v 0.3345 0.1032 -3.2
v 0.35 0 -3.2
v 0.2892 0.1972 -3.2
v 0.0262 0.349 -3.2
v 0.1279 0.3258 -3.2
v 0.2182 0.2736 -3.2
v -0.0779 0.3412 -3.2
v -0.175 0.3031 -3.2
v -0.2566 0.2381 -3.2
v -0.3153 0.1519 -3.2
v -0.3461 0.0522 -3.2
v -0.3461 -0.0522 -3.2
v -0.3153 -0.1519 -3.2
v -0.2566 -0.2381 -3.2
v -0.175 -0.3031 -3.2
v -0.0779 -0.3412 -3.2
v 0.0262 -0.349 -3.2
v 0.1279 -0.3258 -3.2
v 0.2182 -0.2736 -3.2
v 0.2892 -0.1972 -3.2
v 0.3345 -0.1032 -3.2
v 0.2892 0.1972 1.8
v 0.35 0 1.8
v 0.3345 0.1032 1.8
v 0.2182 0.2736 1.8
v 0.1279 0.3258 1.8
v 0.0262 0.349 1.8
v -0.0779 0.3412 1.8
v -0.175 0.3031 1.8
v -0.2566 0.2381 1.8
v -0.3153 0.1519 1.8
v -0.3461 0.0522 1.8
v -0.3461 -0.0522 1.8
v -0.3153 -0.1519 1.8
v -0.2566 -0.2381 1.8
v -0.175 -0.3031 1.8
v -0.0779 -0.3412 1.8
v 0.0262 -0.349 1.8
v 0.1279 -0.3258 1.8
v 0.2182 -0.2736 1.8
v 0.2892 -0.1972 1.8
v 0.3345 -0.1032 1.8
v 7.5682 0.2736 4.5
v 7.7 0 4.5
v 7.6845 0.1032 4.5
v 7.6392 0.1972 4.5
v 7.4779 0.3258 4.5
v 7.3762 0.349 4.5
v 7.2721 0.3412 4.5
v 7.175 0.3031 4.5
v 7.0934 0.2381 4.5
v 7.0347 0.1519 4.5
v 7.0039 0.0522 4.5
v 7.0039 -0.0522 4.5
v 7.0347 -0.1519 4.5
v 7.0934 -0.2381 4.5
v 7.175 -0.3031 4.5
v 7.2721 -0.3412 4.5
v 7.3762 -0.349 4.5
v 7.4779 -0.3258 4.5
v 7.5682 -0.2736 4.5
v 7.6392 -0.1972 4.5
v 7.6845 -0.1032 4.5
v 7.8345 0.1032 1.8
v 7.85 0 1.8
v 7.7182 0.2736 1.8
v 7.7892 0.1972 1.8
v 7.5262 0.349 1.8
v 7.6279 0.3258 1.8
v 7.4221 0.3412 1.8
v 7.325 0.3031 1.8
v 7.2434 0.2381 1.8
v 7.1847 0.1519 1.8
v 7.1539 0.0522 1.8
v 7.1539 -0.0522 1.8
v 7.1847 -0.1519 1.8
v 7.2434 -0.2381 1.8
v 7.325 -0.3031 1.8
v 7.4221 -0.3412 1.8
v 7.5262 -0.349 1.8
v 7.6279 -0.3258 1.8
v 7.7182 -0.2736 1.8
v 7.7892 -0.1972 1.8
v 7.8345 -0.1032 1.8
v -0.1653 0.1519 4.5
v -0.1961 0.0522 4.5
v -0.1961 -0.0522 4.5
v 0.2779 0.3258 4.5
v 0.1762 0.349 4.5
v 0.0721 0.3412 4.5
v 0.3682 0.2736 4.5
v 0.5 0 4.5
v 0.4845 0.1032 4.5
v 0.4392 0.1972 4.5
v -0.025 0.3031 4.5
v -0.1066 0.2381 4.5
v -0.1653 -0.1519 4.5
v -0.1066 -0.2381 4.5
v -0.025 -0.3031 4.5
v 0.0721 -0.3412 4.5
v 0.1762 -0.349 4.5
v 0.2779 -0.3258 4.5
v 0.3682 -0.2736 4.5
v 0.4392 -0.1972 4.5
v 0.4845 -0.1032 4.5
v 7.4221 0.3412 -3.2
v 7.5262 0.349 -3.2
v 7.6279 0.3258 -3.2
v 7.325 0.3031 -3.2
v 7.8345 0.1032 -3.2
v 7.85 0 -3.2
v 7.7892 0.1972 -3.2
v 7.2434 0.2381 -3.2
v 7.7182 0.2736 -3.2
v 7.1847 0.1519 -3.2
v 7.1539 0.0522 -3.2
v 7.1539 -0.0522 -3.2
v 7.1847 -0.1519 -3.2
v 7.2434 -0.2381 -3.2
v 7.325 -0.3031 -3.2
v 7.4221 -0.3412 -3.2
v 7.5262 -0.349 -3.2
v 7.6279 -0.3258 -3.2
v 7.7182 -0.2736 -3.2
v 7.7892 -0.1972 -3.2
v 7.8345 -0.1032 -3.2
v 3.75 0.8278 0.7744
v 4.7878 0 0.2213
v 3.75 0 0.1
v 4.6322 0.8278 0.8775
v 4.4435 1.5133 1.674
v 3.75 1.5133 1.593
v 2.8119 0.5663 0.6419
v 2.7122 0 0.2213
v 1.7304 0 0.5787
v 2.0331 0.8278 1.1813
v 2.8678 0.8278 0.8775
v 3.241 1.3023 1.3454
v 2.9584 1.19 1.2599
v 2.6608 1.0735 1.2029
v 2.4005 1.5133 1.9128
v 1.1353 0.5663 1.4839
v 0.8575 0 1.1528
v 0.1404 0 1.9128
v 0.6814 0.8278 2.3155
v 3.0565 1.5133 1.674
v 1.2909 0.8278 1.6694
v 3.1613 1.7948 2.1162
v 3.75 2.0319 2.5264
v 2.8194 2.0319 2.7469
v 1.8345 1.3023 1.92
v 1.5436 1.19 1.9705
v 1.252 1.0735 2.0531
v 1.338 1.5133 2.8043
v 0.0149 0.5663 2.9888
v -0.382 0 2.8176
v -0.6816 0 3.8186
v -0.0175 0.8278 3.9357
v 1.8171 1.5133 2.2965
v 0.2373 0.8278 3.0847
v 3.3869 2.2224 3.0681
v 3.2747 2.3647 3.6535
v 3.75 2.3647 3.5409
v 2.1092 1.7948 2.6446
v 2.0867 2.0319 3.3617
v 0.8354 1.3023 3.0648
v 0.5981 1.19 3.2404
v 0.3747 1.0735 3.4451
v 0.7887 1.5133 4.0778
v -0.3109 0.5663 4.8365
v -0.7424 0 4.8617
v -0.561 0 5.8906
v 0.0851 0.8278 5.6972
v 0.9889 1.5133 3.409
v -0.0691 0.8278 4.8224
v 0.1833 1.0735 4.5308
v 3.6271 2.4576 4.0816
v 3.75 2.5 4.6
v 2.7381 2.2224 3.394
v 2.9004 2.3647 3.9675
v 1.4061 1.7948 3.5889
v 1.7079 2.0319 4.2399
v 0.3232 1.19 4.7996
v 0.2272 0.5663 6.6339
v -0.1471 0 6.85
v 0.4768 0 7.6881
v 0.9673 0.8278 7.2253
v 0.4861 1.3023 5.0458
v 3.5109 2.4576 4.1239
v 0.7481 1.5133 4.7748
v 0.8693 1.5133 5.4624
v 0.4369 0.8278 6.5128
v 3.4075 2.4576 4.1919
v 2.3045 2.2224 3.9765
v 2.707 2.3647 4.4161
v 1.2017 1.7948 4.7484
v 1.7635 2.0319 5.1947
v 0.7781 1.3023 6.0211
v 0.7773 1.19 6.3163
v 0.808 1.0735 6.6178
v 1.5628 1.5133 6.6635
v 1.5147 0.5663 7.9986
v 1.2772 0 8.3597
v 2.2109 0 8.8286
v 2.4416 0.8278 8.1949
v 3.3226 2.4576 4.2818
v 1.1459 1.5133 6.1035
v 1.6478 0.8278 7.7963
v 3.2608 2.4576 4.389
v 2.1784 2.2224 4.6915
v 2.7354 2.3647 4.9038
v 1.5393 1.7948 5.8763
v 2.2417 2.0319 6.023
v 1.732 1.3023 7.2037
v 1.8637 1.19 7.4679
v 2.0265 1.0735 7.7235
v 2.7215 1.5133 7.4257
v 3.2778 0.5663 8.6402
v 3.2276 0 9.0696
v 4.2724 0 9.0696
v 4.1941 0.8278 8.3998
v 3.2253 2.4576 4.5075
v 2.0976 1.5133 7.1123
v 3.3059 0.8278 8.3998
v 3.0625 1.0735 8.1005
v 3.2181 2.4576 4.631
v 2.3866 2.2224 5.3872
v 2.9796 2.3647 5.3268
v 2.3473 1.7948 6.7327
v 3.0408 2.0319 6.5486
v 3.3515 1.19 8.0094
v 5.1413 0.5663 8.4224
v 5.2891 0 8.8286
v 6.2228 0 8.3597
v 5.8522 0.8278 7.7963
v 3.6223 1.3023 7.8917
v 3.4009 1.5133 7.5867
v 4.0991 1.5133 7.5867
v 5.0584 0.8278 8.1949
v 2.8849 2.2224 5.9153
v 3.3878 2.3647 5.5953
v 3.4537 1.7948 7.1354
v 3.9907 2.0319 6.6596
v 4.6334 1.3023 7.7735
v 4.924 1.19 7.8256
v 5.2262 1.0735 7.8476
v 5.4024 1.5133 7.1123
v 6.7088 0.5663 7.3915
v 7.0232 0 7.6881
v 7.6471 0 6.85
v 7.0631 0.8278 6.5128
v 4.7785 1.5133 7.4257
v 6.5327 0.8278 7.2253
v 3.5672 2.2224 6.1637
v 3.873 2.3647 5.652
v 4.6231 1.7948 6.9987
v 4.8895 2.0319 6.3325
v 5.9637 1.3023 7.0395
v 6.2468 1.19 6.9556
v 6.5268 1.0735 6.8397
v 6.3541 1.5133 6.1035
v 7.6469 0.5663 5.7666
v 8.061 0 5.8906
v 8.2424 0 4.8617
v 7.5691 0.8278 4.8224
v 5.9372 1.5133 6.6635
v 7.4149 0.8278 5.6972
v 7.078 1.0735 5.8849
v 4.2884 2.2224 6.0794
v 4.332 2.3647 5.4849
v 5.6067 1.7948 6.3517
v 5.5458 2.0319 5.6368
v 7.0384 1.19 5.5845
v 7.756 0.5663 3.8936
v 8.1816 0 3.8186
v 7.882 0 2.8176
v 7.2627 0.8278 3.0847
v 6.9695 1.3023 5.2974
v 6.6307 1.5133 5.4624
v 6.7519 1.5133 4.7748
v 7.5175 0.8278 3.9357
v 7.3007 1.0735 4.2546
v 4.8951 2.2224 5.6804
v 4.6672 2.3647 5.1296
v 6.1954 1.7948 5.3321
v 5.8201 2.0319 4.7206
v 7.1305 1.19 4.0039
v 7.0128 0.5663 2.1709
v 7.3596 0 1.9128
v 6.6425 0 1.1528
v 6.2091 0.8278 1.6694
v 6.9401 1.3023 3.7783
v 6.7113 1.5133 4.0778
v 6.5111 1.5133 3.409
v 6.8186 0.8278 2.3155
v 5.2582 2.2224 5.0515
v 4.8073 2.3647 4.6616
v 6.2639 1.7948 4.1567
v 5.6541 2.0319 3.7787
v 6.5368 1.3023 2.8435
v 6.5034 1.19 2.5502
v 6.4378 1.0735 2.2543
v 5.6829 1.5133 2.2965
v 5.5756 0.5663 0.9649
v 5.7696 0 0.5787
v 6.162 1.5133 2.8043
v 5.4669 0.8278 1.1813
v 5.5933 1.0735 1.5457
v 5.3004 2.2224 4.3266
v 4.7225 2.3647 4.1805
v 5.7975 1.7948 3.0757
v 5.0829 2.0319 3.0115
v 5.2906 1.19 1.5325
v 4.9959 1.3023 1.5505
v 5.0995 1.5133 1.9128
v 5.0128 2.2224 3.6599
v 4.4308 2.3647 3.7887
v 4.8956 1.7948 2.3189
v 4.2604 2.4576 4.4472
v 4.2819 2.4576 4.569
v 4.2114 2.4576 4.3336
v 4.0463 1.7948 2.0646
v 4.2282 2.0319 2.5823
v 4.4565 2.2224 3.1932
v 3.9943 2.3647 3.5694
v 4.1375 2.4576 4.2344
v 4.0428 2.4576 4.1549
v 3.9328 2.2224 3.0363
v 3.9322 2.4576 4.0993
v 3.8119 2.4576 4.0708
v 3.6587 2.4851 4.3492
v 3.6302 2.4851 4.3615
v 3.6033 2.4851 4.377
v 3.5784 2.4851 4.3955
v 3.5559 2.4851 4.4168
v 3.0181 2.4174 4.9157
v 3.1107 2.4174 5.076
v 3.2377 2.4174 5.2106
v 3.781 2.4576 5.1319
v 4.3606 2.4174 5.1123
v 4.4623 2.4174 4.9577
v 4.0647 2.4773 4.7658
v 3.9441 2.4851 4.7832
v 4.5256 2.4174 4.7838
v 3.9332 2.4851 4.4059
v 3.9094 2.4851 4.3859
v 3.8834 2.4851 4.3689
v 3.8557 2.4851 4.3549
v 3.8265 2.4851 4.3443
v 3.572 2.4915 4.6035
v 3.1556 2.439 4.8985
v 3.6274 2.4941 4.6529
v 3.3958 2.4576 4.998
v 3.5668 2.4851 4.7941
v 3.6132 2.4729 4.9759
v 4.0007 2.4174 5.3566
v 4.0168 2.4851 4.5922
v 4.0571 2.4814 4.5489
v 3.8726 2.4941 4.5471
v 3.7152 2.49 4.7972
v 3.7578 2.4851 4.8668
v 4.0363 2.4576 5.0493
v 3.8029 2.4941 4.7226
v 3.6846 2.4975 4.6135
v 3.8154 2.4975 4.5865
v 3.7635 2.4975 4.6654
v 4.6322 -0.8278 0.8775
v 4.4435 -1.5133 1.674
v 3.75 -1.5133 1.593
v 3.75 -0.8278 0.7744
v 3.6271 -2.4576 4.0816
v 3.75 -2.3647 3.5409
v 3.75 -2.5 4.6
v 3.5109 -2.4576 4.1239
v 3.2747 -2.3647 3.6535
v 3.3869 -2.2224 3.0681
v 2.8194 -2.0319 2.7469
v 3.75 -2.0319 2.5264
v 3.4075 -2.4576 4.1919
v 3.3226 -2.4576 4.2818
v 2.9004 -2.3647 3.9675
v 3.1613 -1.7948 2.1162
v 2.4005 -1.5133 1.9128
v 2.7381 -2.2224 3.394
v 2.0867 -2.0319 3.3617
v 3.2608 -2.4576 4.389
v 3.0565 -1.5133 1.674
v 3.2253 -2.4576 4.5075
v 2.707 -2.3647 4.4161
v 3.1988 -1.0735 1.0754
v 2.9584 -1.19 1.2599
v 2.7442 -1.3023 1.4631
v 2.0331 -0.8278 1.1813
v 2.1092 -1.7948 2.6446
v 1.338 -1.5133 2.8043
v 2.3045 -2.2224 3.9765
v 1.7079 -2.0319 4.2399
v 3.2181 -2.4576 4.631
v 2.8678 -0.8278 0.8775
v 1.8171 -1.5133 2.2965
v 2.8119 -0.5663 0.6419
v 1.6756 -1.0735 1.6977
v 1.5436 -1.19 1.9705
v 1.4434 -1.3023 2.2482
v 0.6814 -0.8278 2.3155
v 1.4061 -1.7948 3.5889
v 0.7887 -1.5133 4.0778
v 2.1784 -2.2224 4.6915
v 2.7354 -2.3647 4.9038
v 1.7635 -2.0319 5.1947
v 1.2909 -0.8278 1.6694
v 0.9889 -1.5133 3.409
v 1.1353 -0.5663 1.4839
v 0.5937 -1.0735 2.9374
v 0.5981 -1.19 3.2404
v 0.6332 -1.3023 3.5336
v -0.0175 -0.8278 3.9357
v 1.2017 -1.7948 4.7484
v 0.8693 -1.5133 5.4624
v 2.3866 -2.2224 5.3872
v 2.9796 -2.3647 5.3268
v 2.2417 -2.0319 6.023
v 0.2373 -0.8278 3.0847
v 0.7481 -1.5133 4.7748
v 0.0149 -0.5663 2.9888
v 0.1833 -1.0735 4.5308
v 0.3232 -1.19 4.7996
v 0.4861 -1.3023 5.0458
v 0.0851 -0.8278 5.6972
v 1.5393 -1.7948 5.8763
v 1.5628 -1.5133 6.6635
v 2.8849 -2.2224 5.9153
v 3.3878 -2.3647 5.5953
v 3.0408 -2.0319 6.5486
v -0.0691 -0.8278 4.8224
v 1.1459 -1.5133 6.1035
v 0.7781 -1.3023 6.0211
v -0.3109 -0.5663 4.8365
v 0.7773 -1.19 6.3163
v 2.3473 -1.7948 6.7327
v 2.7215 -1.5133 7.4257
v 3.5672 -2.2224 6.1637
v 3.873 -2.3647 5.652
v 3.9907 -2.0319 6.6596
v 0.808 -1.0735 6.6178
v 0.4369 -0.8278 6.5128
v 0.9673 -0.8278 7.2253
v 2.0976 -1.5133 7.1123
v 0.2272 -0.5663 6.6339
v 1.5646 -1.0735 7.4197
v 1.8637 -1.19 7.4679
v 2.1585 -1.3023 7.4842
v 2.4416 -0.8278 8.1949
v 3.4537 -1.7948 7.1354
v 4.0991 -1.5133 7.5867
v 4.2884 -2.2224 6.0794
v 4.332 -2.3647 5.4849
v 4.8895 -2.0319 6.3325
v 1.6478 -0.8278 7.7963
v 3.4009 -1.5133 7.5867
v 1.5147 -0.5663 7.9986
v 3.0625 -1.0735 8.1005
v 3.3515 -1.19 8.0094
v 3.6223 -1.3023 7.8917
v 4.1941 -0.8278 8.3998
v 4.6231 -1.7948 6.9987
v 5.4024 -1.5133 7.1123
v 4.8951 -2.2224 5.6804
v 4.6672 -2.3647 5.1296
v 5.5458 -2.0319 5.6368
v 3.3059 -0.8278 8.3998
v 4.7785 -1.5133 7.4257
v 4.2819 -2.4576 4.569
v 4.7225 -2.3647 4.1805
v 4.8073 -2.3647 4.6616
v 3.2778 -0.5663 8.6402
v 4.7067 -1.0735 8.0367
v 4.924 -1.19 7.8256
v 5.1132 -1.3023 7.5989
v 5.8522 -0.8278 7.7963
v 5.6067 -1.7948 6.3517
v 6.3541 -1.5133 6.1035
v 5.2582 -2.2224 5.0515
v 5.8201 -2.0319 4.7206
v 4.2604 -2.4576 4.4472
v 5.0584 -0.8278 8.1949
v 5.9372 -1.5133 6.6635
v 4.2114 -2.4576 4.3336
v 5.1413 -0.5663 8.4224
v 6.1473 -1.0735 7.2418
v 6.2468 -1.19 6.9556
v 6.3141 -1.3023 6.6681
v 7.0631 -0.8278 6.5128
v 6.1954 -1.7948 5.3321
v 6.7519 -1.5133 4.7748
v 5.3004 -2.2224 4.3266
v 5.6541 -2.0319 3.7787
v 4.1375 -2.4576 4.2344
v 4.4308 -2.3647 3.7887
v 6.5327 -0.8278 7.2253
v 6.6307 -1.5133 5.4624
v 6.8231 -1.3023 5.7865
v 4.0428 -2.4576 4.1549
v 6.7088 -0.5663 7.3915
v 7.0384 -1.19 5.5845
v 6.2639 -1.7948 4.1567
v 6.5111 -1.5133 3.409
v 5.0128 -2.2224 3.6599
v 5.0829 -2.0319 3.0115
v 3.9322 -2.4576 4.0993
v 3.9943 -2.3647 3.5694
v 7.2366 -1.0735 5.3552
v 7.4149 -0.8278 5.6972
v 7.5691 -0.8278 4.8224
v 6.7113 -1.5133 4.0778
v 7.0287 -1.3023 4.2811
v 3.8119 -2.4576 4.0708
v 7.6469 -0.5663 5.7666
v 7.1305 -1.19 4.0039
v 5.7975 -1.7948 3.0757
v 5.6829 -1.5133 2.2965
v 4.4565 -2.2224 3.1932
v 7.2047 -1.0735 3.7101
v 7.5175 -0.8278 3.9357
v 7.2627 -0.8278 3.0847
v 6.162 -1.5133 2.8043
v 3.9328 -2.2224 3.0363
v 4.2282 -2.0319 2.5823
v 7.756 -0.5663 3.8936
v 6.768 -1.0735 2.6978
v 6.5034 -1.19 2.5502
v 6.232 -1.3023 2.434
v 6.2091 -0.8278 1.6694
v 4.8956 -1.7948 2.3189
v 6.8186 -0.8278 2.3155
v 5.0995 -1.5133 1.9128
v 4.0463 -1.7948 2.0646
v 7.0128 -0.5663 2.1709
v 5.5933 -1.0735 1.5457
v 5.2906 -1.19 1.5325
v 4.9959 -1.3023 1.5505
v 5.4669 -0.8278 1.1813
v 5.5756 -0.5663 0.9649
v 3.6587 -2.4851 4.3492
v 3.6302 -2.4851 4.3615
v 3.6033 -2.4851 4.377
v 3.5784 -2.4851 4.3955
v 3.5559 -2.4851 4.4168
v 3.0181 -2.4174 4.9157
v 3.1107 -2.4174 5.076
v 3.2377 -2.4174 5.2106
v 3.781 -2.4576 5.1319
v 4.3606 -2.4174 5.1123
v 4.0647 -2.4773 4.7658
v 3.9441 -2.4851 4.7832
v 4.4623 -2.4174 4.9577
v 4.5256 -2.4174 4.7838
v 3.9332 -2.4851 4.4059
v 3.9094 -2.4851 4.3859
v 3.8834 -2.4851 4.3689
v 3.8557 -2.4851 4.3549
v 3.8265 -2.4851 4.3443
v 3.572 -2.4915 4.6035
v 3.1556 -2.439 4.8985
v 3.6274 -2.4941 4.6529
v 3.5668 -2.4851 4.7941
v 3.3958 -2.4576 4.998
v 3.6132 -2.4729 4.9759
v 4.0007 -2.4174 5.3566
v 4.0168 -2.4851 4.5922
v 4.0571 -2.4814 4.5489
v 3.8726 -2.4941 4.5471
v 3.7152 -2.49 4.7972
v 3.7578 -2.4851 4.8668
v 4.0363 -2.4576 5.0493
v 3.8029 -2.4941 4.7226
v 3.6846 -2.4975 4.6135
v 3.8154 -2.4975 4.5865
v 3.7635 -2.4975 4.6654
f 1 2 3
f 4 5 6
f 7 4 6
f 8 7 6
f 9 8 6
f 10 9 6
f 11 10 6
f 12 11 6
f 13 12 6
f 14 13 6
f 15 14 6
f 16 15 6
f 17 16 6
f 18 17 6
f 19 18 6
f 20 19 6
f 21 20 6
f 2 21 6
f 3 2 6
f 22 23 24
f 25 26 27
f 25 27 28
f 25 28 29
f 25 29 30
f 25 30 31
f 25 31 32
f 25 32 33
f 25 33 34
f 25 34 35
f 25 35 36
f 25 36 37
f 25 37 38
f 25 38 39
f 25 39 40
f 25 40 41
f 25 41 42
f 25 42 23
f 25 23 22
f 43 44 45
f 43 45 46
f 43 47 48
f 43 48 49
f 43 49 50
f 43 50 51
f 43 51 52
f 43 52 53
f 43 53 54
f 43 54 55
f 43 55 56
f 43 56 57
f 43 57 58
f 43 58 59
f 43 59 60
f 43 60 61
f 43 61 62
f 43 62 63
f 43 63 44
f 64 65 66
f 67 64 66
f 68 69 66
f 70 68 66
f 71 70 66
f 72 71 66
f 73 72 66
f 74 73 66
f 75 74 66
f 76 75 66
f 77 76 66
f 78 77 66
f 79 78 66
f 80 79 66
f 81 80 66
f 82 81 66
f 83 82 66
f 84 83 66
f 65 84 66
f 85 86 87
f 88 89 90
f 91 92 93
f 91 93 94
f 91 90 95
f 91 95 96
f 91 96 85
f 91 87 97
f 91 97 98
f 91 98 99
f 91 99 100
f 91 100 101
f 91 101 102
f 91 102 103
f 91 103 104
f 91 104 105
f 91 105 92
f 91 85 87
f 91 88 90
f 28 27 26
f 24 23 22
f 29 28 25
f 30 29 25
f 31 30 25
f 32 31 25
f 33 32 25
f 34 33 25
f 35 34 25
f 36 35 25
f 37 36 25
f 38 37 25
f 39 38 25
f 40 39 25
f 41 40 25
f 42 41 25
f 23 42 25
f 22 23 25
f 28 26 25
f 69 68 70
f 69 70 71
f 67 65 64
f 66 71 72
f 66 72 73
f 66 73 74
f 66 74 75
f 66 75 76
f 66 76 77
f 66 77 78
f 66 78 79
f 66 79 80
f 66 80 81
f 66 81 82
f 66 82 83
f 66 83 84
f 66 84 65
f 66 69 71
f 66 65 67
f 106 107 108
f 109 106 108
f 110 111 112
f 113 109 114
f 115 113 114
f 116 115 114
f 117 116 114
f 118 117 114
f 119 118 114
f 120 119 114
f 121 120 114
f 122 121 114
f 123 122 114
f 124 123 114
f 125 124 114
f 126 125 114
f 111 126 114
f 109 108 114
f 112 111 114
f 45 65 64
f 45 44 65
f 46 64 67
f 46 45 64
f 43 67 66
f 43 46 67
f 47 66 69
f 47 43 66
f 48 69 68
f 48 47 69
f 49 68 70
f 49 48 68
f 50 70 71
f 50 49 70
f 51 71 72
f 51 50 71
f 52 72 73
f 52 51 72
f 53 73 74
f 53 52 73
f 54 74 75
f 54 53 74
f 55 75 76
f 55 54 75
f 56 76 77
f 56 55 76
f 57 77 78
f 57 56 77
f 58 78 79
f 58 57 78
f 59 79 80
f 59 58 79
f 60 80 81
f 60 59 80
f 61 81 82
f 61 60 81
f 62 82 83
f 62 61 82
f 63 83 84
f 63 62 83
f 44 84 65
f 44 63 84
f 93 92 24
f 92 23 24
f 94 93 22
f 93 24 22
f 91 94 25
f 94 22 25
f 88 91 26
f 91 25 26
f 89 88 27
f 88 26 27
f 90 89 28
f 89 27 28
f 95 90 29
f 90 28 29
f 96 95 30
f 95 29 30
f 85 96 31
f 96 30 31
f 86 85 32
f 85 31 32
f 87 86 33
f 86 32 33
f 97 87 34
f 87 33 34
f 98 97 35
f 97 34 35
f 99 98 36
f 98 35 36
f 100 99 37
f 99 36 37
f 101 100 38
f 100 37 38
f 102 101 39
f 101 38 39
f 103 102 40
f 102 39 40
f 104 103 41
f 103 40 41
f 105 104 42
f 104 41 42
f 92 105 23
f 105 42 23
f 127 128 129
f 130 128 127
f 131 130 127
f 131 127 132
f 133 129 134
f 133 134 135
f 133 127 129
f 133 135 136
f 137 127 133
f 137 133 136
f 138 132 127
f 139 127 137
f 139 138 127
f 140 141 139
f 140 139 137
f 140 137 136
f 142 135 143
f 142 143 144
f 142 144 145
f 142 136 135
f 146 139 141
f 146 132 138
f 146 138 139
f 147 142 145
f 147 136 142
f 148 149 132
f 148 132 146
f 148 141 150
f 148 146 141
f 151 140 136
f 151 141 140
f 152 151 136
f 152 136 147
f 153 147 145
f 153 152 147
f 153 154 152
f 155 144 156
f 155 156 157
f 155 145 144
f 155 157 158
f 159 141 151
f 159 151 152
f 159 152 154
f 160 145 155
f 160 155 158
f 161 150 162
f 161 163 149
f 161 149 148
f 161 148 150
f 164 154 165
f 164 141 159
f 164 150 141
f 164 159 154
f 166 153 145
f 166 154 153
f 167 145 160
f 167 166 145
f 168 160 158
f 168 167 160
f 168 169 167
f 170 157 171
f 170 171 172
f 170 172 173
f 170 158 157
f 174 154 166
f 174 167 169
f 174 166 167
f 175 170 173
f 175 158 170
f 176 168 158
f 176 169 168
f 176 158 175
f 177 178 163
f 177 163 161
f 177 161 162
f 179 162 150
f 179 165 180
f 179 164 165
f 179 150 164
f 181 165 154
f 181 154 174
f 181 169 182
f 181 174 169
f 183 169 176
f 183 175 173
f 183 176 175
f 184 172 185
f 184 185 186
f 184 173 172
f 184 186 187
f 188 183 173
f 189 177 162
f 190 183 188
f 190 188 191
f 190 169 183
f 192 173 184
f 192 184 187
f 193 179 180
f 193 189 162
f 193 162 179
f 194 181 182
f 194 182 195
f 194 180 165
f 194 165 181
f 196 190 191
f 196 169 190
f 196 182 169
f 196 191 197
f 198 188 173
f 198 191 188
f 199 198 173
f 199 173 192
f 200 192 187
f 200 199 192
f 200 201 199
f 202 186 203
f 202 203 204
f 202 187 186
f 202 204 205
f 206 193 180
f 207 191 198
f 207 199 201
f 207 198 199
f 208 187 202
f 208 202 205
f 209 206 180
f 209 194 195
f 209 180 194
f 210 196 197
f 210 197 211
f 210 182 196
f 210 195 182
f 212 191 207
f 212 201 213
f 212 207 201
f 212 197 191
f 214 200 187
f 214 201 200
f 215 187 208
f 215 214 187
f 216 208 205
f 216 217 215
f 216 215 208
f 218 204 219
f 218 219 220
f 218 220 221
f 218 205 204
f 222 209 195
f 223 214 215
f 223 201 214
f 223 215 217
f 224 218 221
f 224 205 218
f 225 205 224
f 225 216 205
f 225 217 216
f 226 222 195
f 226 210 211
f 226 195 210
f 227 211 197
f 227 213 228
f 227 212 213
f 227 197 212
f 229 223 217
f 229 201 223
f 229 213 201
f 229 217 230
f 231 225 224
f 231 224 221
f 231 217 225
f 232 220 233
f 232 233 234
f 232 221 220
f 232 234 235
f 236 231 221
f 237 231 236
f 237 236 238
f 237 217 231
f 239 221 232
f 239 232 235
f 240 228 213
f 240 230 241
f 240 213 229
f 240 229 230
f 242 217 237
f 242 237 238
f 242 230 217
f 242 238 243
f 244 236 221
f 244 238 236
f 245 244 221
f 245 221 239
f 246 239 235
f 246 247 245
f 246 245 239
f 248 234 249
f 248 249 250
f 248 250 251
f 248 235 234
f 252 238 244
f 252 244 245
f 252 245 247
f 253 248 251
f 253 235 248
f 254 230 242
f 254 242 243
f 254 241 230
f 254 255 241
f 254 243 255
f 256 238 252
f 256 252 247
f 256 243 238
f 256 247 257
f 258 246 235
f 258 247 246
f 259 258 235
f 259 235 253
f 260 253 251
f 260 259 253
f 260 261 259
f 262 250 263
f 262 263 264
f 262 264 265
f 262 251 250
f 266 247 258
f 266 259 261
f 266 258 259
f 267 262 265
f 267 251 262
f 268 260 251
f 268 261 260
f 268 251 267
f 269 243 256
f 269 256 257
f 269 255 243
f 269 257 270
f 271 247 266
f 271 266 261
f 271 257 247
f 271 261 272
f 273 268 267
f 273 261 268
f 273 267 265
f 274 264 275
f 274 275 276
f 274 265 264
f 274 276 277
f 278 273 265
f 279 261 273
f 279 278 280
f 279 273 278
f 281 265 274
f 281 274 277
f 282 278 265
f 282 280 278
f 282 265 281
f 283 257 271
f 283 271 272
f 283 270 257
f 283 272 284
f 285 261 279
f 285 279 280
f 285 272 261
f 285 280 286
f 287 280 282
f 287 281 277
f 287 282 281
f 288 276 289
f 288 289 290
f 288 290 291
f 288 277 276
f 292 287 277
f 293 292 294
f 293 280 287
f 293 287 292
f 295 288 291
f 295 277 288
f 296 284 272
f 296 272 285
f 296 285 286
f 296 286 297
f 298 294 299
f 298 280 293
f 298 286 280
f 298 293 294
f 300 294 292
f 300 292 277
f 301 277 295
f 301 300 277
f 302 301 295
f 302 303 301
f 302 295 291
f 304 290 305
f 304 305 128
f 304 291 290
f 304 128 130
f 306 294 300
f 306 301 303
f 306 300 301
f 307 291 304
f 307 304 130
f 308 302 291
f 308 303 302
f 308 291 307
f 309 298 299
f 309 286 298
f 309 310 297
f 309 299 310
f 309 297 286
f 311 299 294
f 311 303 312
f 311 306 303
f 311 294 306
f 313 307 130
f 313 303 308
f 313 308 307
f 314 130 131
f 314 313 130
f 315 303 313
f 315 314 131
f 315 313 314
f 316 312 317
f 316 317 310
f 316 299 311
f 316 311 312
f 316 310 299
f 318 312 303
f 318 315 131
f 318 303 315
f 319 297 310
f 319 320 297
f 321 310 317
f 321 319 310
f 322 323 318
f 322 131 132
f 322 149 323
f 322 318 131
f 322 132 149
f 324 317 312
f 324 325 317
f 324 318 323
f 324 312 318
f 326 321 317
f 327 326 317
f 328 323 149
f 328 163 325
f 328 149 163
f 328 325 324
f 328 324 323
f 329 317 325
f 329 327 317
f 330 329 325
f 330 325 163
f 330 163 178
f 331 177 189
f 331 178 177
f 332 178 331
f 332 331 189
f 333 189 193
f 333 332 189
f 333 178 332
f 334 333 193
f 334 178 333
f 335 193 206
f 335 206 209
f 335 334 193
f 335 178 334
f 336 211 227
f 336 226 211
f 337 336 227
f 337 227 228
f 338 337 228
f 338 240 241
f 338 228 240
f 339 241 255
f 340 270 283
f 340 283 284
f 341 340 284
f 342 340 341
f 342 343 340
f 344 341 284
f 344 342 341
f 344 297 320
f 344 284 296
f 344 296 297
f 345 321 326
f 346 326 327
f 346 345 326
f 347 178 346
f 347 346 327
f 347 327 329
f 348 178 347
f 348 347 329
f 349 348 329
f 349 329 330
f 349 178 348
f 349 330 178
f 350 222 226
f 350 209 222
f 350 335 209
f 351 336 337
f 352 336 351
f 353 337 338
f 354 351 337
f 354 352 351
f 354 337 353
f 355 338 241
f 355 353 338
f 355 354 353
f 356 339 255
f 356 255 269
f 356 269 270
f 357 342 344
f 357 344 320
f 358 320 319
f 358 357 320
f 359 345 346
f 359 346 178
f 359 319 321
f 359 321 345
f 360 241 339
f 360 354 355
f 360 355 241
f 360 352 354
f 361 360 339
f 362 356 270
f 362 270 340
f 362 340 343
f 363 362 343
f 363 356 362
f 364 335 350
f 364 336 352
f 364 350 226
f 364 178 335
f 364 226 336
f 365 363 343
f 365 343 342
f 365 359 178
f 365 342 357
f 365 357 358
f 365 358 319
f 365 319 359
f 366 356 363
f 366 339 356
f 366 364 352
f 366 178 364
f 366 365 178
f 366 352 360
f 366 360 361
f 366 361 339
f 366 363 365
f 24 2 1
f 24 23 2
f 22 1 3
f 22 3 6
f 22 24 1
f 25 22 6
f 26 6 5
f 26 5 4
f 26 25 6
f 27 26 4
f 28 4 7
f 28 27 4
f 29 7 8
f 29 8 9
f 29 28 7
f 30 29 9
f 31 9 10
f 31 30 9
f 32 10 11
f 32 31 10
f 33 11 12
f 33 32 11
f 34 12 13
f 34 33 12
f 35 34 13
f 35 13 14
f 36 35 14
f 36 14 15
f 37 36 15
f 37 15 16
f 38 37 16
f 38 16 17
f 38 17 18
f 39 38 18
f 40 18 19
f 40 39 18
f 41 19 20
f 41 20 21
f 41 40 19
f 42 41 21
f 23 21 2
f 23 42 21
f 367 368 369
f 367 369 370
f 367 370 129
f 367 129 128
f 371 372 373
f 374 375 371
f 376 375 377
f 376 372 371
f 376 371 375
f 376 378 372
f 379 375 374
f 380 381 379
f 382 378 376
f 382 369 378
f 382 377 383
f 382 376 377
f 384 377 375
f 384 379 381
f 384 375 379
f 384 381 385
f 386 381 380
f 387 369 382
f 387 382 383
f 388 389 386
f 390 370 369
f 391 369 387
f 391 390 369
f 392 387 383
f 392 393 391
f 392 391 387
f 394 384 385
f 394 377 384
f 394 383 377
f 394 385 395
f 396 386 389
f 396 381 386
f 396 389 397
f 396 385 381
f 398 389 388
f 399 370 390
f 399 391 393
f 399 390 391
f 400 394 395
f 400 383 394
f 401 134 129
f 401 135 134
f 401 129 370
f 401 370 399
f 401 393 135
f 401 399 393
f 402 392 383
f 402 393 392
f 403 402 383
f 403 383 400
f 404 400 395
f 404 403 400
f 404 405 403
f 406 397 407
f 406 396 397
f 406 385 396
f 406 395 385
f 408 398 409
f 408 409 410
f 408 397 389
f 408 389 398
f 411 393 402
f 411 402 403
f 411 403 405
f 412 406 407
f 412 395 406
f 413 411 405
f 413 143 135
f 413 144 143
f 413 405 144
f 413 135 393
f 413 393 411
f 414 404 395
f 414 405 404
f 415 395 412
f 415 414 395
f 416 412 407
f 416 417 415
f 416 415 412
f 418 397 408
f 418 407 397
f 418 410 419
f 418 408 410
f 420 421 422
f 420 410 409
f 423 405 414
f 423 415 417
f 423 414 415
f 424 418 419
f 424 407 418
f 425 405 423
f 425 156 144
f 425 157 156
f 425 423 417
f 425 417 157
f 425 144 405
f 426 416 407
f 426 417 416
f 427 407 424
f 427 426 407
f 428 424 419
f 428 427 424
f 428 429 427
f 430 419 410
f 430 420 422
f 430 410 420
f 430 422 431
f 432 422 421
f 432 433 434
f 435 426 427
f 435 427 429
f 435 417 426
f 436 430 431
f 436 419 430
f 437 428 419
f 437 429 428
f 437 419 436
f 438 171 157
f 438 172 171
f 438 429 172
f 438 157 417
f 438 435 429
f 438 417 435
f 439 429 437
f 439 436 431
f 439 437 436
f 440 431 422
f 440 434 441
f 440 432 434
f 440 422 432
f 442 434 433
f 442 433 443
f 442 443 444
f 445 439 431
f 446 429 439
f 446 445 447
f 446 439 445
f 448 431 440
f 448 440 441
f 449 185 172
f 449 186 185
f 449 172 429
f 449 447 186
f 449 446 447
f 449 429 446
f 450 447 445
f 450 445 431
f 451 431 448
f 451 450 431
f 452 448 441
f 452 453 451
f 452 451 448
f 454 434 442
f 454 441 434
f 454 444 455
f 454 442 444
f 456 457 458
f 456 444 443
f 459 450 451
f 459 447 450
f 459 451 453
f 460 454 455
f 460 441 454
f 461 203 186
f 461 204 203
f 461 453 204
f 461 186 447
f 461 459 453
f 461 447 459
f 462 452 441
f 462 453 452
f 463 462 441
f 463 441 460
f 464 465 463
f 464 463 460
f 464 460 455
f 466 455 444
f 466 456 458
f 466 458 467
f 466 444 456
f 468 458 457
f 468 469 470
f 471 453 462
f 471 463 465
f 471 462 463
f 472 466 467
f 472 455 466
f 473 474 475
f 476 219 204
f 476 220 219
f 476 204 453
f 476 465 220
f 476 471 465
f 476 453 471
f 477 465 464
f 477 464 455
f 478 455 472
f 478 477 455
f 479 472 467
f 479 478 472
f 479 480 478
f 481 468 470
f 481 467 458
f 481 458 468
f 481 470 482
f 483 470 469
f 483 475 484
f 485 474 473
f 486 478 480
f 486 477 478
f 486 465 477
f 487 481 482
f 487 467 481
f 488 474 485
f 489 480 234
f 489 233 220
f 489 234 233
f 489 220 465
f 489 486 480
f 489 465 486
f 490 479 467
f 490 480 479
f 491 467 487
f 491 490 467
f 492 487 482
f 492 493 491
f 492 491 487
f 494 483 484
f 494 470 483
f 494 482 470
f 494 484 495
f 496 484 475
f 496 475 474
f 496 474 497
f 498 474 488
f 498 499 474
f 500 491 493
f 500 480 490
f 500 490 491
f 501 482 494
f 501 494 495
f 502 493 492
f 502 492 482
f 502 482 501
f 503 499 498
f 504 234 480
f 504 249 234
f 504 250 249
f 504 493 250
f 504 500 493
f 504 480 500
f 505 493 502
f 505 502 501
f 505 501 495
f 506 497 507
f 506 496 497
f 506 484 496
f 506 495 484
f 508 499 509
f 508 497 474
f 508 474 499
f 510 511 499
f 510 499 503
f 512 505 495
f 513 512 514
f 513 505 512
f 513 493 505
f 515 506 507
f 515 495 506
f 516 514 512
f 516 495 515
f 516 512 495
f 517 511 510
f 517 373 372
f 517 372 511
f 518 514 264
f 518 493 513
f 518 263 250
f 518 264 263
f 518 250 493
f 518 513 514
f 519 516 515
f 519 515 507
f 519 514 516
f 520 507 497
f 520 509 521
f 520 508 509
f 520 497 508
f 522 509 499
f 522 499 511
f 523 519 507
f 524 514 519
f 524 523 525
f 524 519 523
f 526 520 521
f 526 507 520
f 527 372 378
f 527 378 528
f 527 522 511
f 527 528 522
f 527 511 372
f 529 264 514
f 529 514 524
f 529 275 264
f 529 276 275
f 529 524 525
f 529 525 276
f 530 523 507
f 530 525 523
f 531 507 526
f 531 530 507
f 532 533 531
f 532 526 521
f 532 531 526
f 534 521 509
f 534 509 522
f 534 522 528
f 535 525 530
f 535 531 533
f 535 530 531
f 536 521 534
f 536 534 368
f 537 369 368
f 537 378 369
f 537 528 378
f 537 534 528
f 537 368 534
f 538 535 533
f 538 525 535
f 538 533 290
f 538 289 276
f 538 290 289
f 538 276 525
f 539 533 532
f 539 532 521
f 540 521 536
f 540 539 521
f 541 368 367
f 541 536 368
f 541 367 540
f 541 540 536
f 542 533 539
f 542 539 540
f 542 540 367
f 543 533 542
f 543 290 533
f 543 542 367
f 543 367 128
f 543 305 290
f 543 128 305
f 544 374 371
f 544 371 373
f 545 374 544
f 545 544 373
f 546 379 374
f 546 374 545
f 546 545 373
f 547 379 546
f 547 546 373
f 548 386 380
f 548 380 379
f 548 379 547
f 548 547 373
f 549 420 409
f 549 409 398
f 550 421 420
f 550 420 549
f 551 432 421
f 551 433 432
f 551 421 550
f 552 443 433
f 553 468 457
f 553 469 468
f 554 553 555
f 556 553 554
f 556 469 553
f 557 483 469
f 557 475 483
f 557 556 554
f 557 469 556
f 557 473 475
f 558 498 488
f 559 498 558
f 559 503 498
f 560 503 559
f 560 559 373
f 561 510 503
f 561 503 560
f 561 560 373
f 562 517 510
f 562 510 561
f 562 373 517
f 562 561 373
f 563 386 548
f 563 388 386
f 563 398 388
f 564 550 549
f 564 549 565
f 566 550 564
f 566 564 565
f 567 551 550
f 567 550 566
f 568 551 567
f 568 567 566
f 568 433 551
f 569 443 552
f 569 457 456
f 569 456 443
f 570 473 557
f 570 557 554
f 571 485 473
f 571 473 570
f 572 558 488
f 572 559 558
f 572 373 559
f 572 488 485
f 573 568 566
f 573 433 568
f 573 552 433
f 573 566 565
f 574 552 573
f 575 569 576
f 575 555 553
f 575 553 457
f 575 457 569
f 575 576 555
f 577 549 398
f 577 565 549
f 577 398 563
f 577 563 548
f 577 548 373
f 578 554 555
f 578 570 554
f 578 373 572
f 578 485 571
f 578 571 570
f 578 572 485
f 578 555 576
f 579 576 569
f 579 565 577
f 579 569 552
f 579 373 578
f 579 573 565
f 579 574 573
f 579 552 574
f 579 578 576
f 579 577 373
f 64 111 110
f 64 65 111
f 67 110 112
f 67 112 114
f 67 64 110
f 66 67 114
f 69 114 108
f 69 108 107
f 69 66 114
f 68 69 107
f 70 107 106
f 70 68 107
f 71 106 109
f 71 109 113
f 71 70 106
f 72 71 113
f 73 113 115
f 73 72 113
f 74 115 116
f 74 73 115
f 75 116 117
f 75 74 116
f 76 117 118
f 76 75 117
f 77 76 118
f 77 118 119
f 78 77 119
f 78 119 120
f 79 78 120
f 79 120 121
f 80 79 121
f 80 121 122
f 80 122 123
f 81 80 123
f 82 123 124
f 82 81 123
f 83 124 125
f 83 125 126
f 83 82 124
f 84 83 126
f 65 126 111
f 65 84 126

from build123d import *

# Parameters (mm, degrees)
SKETCH001_R       = 0.35
PAD001_DEPTH      = 1.8
PAD001_DEPTH_BACK = 3.2
SKETCH002_R       = 0.35
SKETCH003_R       = 0.35
SKETCH004_R       = 0.35
SKETCH005_R       = 0.35


with BuildPart() as pad001:
    # Sketch001 → Pad001 (new body, two sides)
    with BuildSketch(Plane.XY) as pad001_sk:
        Circle(SKETCH001_R)
        with Locations((7.5, 0)):
            Circle(SKETCH001_R)
    extrude(amount=PAD001_DEPTH)
    extrude(pad001_sk.sketch, amount=-PAD001_DEPTH_BACK)


with BuildPart() as revolution:
    # Sketch → Revolution (revolve)
    with BuildSketch(Plane.YZ.offset(3.75)):
        with BuildLine():
            Line((-2.5, 4.6), (2.5, 4.6))
            ThreePointArc((0, 0.1), (1.794778, 2.047346), (2.5, 4.6))
            ThreePointArc((-2.5, 4.6), (-1.794778, 2.047346), (0, 0.1))
        make_face()
    revolve(axis=Axis((3.75, -3.32079, 4.6), (0, 1, 0)))


with BuildPart() as loft_body:
    # Sketch002 → Loft section 0
    with BuildSketch(Plane.XY.offset(4.5)):
        with Locations((0.15, 0)):
            Circle(SKETCH002_R)
    # Sketch003 → Loft section 1
    with BuildSketch(Plane.XY.offset(1.8)):
        Circle(SKETCH003_R)
    loft()


with BuildPart() as loft001:
    # Sketch004 → Loft001 section 0
    with BuildSketch(Plane.XY.offset(1.8)):
        with Locations((7.5, 0)):
            Circle(SKETCH004_R)
    # Sketch005 → Loft001 section 1
    with BuildSketch(Plane.XY.offset(4.5)):
        with Locations((7.35, 0)):
            Circle(SKETCH005_R)
    loft()


solid = Compound([pad001.part, revolution.part, loft_body.part, loft001.part])
